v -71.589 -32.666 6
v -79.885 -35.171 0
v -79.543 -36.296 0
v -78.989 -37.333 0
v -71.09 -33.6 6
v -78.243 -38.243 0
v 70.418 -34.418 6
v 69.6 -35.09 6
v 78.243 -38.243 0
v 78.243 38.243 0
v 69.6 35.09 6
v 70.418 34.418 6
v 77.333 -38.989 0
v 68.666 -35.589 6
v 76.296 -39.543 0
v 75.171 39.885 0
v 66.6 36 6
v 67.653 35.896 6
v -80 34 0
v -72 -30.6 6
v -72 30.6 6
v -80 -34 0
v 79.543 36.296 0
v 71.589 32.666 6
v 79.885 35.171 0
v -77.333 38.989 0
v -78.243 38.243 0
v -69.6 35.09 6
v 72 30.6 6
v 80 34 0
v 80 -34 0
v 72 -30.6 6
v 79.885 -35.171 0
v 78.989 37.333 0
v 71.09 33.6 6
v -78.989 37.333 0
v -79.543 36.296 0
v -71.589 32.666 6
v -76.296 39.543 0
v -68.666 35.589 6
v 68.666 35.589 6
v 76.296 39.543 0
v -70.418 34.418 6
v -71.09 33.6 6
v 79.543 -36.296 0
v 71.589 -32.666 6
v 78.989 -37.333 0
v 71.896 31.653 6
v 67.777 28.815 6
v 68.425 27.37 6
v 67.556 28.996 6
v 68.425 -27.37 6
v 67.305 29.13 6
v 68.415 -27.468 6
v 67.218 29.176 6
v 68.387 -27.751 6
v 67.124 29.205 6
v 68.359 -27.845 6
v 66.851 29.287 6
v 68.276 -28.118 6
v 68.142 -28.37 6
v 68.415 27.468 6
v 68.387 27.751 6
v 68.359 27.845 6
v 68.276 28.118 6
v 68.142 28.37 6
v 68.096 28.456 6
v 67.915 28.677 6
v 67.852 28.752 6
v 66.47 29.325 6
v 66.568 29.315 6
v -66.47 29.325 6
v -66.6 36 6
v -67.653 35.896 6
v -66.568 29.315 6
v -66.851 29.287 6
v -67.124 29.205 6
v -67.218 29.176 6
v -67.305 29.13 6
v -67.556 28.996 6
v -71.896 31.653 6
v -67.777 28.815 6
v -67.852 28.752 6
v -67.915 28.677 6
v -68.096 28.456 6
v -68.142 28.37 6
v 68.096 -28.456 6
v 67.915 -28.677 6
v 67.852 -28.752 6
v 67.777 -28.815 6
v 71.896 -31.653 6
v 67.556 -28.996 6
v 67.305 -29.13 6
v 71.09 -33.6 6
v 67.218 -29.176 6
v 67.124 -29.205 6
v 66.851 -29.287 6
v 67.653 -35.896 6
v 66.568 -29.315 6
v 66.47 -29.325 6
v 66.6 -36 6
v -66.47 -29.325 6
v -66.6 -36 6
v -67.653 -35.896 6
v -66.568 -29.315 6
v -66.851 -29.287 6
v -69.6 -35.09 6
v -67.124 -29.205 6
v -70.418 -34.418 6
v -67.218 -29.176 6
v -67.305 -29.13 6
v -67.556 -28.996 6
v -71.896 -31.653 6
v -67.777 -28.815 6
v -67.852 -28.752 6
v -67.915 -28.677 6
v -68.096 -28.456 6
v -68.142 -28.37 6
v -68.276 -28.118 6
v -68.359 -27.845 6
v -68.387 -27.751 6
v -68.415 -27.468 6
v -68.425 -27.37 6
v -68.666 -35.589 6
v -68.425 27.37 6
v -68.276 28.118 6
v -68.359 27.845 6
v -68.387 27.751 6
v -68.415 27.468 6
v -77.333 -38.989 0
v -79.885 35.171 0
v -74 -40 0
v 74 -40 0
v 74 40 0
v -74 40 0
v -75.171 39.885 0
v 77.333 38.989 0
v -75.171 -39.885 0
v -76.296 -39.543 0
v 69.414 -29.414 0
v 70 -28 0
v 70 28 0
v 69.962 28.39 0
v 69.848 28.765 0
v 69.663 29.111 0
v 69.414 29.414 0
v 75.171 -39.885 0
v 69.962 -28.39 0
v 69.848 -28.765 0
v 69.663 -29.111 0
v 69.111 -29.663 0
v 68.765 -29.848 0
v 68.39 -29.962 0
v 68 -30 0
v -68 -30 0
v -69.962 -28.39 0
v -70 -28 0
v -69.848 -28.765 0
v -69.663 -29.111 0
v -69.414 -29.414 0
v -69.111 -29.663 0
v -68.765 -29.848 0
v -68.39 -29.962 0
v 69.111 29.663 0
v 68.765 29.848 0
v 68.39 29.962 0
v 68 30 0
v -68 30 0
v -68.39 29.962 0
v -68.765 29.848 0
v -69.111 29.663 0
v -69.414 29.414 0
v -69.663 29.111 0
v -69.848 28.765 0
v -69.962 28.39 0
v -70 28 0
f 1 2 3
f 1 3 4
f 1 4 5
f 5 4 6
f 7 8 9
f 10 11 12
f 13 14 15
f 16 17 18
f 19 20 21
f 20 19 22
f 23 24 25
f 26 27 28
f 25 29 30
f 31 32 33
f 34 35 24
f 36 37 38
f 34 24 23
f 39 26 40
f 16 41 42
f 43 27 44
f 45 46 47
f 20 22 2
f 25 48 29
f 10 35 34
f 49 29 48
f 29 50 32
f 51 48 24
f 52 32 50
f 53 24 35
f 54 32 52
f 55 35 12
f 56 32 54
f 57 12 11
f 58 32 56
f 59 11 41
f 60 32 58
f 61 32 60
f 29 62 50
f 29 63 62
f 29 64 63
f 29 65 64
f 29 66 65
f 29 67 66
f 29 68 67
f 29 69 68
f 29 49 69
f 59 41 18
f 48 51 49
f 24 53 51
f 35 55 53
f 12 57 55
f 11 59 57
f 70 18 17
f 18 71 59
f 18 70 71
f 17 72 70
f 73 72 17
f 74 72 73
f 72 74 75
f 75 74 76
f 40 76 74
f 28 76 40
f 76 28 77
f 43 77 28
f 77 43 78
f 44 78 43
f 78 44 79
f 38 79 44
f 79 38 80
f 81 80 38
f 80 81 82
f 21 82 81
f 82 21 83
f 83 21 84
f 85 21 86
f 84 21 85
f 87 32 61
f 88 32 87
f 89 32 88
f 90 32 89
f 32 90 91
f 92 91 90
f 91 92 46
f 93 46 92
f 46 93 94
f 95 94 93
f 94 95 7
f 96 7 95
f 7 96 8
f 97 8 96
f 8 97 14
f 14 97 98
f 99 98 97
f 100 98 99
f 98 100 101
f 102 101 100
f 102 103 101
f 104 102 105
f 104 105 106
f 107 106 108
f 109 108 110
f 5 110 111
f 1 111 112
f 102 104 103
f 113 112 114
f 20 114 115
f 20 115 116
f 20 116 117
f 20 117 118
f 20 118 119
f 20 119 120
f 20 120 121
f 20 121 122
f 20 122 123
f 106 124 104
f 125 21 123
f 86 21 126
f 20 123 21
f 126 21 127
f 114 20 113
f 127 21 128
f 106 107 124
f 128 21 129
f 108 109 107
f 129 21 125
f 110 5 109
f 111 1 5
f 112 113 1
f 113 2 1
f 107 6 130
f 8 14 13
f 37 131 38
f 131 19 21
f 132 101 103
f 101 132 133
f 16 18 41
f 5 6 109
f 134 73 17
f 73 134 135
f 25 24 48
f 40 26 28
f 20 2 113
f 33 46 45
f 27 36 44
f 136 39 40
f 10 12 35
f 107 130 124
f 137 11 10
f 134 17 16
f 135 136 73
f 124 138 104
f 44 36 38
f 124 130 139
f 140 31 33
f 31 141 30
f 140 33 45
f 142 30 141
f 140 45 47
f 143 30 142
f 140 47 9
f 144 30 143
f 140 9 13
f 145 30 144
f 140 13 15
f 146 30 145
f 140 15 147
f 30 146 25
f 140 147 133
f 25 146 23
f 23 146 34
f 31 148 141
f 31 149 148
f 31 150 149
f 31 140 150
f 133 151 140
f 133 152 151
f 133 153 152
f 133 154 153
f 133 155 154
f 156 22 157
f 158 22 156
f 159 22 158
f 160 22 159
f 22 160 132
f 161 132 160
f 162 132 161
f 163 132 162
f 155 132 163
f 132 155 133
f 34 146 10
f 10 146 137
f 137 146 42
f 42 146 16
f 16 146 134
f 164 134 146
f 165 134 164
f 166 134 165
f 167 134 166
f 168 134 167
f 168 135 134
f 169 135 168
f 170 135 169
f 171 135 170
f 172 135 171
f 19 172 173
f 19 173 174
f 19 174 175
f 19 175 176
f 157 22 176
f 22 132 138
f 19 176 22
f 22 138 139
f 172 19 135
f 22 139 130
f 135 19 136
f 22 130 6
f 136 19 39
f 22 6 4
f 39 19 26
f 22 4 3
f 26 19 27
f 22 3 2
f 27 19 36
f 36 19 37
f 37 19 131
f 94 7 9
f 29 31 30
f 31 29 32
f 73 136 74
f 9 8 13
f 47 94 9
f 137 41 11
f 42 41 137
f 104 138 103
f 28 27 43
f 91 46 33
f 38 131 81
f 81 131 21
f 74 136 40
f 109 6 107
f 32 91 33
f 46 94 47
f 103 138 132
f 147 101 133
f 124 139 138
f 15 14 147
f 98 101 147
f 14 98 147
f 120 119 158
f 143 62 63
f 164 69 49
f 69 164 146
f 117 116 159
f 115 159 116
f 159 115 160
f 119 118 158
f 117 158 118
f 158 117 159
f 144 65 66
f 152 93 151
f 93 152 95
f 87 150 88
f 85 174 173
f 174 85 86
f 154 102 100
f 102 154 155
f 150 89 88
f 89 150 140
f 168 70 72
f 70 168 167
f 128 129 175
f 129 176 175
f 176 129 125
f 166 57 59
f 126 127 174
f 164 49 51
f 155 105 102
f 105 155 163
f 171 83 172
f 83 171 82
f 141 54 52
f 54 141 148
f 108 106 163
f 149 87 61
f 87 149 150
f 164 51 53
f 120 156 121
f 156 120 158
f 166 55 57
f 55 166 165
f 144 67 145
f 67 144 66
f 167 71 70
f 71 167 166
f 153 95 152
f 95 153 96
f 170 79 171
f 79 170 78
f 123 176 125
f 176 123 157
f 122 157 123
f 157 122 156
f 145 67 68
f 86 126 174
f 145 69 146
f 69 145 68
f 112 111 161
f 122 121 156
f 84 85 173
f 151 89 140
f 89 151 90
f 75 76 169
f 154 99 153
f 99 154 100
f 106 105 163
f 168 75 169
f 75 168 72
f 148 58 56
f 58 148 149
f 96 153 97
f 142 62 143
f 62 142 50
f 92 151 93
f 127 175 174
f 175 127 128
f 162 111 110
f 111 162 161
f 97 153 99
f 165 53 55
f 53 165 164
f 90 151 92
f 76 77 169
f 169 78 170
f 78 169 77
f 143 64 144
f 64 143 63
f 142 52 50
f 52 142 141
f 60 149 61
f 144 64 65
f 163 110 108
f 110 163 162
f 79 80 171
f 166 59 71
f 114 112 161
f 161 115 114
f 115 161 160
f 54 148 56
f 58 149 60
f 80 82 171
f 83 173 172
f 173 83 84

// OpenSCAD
$fn = 32;

// ----------------------------------------------------------------------
// Display bezel: 160 x 80 mm frame, opening 140x60 mm
// ----------------------------------------------------------------------

// --- parameters (mm) ---
length = 160;             // frame outside length, X
width = 80;               // frame outside width, Y
frame_w = 10;             // frame width
thickness = 6;            // frame thickness
corner_r = 6;             // outside corner radius
chamfer = 0.9;            // outer wall taper
funnel = 0.97;            // inner opening taper
opening_l = 140;          // opening length
opening_w = 60;           // opening width
inner_r = 2;              // opening corner radius

/* rounded-rectangle outlines, generated with loops */
module rounded_ring(l_nom, w_nom, r) {
  hull() {
    for (sx = [-1, 1]) for (sy = [-1, 1])
      translate([sx * (l_nom / 2 - r), sy * (w_nom / 2 - r)]) circle(r = r);
  }
}

difference() {
  /* frame body, drafted so the outer edge is a variable-depth chamfer */
  linear_extrude(height = thickness, scale = chamfer)
    rounded_ring(length, width, corner_r);
  /* viewing opening, drafted the other way for a funnel edge */
  linear_extrude(height = thickness + 2, scale = funnel)
    translate([0, 0, -1]) rounded_ring(opening_l, opening_w, inner_r);
}
